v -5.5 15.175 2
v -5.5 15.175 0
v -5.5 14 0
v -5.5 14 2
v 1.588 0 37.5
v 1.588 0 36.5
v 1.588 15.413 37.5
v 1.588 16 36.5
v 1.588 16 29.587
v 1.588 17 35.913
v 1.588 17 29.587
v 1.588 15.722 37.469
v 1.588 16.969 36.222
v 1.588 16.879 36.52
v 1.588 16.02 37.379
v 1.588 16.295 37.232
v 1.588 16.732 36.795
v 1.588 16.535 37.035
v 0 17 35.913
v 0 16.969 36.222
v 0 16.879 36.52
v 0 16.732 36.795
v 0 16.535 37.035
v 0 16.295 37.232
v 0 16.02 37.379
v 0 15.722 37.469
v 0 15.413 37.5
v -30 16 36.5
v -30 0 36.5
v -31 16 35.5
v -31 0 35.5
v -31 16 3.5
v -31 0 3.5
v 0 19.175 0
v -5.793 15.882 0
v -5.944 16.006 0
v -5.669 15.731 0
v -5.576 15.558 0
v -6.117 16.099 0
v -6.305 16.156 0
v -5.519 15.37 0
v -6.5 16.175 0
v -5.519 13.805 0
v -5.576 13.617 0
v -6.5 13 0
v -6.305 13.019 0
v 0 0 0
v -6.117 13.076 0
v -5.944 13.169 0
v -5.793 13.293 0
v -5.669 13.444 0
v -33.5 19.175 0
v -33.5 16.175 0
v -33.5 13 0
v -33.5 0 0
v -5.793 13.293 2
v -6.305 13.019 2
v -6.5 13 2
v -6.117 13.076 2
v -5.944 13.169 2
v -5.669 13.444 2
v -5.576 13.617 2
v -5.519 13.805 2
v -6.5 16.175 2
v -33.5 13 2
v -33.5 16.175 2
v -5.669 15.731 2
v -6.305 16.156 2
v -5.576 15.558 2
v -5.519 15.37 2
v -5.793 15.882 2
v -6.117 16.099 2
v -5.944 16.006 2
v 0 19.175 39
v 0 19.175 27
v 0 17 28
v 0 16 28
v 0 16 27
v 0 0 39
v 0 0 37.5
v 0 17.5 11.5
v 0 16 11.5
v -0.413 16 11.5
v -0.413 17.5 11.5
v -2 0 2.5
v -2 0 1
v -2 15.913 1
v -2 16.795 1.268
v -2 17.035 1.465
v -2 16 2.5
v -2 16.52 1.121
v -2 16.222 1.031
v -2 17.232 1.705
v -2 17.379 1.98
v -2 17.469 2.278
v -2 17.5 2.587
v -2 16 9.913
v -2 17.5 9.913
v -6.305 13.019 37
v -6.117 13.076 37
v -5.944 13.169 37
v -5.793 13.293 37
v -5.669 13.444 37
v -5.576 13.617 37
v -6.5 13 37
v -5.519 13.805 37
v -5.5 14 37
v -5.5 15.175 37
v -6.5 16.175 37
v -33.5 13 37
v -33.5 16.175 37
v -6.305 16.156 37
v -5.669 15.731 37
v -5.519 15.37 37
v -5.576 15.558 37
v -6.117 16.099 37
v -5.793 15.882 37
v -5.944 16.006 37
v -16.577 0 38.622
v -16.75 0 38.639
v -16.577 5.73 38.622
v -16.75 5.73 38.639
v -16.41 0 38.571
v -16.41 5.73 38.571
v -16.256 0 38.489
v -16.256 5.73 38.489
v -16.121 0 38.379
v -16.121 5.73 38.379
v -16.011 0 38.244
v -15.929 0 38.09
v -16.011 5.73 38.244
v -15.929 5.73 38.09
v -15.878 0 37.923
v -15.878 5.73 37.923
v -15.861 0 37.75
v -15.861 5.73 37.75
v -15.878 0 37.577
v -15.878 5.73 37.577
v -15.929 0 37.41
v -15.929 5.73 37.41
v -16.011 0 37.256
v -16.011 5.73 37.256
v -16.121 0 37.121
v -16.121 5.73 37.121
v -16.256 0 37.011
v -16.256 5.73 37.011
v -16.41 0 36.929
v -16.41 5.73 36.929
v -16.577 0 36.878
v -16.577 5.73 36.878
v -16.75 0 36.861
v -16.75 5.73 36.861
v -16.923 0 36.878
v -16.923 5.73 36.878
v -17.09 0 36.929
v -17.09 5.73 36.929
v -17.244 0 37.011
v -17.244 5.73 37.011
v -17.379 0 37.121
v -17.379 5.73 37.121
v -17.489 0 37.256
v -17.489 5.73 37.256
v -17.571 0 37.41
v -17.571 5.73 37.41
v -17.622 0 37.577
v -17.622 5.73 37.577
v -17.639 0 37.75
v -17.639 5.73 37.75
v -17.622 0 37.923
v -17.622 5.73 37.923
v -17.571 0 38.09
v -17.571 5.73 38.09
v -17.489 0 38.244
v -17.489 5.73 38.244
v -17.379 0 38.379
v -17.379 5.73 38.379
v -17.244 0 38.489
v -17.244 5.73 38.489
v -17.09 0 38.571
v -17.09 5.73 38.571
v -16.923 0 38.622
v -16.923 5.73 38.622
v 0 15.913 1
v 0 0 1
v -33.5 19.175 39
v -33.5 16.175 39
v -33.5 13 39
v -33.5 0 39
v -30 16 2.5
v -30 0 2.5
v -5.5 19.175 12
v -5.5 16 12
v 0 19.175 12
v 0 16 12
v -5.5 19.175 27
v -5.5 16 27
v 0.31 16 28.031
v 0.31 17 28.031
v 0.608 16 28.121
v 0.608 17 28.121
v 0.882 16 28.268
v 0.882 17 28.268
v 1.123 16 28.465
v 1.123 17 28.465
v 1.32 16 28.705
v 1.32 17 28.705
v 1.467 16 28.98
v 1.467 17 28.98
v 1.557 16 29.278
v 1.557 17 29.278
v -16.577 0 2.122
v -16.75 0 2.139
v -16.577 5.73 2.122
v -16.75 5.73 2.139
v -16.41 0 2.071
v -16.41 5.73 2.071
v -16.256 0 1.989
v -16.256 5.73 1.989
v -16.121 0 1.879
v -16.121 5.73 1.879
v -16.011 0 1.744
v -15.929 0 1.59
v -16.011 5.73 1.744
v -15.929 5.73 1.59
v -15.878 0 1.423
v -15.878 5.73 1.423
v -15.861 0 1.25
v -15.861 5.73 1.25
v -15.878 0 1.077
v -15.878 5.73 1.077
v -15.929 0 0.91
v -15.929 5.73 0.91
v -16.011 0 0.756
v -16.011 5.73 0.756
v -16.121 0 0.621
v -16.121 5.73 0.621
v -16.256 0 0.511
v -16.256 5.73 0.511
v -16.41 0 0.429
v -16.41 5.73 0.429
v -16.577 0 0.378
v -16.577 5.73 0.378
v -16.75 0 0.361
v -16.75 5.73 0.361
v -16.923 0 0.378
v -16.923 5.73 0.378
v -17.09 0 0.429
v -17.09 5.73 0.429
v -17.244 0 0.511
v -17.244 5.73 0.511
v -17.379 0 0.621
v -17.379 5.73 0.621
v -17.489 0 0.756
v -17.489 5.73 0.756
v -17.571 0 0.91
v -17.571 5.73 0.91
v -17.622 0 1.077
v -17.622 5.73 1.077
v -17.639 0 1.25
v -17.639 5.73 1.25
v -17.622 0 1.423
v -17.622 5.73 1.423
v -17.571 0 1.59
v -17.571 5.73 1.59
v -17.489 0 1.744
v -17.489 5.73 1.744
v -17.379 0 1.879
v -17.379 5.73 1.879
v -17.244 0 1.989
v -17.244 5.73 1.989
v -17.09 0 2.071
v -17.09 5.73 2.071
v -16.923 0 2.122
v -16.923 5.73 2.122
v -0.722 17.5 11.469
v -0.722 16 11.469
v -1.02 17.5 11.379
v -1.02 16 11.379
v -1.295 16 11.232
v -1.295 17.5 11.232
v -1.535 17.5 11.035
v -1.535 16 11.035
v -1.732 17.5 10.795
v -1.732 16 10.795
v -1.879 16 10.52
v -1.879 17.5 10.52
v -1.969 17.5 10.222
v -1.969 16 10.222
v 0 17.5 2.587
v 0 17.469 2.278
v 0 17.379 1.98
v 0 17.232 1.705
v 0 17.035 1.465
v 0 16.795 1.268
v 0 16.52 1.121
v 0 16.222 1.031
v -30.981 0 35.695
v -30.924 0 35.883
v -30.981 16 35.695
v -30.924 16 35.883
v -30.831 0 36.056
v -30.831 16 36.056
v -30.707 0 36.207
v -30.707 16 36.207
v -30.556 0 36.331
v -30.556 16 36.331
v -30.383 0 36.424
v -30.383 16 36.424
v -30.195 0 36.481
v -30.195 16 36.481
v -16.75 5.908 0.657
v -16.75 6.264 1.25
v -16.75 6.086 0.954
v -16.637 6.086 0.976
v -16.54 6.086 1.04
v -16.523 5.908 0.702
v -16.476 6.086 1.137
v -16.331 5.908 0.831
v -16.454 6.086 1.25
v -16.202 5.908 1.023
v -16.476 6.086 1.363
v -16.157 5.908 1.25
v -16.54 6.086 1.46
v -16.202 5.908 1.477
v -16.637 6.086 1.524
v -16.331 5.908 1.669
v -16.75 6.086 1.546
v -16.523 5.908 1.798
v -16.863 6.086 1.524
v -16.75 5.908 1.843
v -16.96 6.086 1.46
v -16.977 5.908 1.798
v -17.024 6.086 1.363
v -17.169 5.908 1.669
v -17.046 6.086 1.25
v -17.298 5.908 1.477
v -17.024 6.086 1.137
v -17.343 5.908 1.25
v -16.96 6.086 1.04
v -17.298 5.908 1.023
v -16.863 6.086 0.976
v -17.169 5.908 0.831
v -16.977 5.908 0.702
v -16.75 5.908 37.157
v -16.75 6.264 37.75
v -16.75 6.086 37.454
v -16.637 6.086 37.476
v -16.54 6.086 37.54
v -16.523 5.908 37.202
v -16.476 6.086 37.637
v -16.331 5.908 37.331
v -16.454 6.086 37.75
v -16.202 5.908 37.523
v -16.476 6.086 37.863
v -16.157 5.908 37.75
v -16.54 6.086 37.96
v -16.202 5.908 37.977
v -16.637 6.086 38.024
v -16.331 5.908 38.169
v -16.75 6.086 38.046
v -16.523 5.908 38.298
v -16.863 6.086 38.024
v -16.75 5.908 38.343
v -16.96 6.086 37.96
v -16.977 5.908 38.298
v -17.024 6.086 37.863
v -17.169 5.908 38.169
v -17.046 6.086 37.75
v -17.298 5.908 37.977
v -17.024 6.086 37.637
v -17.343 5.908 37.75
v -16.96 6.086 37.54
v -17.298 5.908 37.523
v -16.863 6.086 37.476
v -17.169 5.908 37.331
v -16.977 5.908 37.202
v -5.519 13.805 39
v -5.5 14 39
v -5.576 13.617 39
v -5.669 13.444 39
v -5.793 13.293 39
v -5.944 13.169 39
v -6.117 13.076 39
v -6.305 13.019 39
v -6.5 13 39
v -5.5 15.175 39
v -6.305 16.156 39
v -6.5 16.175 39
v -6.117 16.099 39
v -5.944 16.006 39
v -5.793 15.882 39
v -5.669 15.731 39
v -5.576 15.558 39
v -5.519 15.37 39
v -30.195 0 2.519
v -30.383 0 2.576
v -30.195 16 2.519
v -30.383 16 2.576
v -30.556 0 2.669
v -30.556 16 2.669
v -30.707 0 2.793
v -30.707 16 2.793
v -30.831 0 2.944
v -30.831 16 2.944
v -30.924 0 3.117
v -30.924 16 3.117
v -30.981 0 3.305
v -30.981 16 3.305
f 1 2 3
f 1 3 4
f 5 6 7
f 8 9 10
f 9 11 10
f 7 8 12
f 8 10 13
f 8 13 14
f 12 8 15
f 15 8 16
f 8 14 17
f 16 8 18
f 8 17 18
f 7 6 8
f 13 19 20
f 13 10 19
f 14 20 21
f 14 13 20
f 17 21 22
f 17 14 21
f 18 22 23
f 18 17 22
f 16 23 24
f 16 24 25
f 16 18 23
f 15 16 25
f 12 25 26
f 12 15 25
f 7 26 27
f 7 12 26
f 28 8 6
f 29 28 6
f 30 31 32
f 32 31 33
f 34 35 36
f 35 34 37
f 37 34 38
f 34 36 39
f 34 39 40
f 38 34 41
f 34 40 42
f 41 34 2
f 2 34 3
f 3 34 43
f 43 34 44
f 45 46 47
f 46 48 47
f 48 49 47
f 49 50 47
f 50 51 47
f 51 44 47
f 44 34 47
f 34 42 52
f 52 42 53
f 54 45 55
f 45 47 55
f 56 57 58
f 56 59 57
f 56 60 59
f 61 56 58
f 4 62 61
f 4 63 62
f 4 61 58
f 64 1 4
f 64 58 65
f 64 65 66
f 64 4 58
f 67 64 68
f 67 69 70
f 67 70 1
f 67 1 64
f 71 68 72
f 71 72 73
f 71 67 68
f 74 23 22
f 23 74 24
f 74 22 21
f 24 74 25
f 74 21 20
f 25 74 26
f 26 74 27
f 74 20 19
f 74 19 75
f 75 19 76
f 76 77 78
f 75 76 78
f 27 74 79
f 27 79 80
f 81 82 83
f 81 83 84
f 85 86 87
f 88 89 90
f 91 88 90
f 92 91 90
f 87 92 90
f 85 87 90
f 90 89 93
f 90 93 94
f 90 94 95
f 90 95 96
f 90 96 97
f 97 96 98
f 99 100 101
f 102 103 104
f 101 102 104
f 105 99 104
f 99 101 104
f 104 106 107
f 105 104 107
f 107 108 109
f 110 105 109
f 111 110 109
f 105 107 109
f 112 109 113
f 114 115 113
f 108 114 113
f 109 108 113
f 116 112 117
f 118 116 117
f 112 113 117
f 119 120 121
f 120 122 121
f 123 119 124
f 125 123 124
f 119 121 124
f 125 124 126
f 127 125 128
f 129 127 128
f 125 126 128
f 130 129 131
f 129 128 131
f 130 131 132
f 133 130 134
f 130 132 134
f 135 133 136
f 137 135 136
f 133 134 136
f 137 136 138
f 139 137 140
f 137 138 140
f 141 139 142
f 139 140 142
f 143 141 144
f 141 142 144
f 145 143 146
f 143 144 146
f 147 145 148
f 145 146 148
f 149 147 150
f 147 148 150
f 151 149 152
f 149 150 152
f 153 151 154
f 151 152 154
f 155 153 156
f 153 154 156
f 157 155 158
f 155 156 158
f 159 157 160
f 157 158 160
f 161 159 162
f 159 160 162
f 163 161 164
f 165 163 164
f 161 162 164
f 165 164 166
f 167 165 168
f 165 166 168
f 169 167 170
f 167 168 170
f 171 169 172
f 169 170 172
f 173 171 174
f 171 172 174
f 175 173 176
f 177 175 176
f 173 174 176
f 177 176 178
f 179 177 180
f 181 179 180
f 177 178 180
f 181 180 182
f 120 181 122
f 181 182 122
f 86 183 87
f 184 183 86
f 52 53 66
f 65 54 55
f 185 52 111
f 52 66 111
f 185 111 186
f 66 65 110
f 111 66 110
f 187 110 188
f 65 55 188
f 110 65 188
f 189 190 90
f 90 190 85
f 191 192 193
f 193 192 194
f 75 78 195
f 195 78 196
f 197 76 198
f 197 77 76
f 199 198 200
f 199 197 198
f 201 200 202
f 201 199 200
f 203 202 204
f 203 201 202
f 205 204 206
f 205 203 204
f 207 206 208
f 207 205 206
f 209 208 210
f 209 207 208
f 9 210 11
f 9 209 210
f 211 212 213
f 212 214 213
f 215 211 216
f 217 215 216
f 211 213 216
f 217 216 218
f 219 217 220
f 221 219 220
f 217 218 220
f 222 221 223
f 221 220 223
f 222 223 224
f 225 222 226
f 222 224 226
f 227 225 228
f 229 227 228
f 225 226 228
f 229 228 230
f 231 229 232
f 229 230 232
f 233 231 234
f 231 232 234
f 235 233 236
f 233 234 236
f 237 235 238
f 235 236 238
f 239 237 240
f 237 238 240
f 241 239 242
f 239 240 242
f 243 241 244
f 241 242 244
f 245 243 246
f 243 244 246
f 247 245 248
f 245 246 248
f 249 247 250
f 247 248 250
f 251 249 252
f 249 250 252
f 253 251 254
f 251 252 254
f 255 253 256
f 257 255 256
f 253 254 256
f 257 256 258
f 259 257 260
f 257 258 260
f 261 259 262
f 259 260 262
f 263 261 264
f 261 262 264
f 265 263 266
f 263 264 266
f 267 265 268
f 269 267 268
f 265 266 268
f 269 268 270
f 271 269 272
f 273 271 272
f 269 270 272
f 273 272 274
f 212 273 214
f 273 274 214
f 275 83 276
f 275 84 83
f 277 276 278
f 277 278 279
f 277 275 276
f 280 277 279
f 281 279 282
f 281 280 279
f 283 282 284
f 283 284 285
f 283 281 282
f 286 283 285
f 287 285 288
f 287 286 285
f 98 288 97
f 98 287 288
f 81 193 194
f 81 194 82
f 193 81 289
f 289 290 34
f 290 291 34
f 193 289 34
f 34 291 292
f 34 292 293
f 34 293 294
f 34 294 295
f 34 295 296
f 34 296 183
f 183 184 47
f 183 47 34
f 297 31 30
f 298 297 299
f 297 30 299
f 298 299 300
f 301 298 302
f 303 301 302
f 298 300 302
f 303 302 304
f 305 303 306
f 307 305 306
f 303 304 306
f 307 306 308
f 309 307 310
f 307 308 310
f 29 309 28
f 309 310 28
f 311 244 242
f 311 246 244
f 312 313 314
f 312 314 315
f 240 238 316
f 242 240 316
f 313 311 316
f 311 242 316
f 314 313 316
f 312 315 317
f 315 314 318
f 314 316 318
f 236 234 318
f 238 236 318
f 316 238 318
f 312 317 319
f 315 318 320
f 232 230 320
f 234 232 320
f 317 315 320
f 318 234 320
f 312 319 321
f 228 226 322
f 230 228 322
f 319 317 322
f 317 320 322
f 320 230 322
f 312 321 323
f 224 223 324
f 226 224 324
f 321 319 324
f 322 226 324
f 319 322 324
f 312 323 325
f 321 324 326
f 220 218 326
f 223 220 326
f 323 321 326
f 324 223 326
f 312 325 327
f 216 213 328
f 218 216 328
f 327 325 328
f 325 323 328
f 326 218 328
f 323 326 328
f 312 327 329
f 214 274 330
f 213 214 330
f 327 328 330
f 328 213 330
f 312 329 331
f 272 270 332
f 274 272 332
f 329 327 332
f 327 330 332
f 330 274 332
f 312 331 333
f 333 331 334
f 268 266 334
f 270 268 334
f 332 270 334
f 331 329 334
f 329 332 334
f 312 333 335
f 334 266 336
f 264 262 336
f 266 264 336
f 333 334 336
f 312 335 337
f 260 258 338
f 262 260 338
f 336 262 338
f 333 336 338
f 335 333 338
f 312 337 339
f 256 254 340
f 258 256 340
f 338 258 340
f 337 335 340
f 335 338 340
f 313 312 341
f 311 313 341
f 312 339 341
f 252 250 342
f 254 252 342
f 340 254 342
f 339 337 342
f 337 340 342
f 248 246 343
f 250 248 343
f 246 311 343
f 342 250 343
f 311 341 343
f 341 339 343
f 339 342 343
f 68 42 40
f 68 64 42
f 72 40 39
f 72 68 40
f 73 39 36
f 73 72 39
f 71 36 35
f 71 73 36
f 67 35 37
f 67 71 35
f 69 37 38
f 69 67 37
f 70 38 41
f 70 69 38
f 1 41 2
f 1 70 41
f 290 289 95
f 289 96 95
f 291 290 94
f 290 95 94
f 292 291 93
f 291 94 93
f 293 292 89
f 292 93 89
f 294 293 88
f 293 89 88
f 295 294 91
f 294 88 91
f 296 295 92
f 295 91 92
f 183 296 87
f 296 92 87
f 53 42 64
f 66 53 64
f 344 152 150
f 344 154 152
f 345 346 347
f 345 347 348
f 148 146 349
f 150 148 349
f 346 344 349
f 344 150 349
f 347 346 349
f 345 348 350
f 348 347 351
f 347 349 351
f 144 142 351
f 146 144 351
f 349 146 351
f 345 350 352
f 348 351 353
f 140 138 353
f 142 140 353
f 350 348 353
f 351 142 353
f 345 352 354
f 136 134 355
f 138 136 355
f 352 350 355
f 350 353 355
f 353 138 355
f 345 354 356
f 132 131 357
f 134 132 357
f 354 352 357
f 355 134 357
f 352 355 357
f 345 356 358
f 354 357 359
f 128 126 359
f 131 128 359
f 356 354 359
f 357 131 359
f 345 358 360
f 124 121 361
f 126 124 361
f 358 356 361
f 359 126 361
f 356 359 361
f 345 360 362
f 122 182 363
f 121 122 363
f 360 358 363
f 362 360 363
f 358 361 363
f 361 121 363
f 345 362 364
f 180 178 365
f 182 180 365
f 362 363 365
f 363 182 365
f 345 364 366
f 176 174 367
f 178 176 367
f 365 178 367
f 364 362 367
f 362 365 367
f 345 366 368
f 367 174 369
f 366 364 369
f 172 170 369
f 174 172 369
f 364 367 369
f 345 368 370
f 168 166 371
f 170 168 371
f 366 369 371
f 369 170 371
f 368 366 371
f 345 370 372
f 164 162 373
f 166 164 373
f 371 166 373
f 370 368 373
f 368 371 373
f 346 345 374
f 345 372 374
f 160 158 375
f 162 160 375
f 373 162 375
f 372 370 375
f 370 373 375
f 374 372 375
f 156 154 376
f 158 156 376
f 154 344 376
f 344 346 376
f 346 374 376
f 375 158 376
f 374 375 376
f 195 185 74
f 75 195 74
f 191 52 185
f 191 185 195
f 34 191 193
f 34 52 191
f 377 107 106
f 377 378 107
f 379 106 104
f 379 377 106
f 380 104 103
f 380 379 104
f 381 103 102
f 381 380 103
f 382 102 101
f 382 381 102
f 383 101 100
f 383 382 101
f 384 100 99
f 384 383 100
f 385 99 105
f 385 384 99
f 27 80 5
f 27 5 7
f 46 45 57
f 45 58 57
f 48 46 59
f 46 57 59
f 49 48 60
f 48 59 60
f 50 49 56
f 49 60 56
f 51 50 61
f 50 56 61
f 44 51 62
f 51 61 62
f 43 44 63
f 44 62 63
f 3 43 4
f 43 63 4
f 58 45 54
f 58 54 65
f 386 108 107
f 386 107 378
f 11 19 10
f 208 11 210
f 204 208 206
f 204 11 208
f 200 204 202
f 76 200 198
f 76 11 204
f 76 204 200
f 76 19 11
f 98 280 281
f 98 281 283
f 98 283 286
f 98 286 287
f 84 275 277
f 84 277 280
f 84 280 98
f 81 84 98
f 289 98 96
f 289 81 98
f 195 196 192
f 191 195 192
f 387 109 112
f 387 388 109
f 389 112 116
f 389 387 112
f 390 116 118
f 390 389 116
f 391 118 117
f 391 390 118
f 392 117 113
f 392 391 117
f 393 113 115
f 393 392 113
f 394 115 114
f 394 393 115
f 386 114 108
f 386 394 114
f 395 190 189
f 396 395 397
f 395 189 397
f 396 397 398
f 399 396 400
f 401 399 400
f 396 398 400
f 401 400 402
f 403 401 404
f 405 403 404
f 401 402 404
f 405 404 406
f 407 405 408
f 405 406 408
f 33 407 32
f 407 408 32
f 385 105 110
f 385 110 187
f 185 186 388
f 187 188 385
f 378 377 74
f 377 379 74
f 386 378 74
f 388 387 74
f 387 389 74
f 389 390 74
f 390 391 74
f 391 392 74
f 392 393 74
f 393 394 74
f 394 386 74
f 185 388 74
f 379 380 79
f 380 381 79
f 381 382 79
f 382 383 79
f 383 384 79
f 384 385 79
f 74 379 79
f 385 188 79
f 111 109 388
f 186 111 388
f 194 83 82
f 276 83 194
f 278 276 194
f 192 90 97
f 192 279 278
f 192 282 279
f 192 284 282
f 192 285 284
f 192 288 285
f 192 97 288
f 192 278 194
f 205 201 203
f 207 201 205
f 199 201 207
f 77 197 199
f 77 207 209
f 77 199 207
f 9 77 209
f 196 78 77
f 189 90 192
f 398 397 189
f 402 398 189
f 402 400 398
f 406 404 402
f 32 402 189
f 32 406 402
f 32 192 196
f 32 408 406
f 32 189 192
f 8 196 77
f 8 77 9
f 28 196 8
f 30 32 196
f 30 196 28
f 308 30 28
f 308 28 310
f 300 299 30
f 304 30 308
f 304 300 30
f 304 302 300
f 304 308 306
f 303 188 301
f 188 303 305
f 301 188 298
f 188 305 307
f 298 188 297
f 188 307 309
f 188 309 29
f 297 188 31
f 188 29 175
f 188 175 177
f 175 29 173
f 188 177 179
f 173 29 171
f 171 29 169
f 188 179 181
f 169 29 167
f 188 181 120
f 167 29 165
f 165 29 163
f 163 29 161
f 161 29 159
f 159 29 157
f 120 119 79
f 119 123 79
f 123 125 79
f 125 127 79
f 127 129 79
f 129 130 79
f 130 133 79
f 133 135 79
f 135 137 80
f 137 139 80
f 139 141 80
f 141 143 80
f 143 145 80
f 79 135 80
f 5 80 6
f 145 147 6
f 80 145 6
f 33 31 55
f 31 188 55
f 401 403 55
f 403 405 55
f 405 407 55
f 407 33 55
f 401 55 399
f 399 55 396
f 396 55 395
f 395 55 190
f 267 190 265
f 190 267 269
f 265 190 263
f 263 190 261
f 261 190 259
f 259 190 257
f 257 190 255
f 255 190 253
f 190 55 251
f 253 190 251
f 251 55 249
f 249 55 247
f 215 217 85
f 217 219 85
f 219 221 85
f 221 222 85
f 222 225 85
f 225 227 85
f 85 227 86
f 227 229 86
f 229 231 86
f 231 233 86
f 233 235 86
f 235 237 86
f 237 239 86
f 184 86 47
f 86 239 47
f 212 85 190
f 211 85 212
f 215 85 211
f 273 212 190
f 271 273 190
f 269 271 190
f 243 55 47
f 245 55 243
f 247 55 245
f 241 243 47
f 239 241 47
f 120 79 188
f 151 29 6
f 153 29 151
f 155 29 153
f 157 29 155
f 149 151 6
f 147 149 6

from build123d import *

# Parameters (mm, degrees)
WALL_DEPTH                = 16
ROOF_START                = 16
ROOF_DEPTH                = 3.175
F_2_56_TAPPED_HOLE1_D     = 1.778
F_2_56_TAPPED_HOLE1_DEPTH = 5.73
F_2_56_TAPPED_HOLE1_TIP   = 0.53416509
BOSS_EXTRUDE1_DEPTH       = 1.5875
CUT_EXTRUDE3_DEPTH        = 2
FILLET1_R                 = 1.5875
RAIL_CUT_DEPTH            = 56.855288749
RAIL_CUT_DEPTH_BACK       = 28
SKETCH4_W                 = 2
SKETCH4_H                 = 3.175
FILLET2_R                 = 1


with BuildPart() as part:
    # MainSketch → Wall (new body)
    with BuildSketch(Plane(origin=(0, 0, 0), x_dir=(1, 0, 0), z_dir=(0, 1, 0))):
        Polygon((-31, -2.5), (0, -2.5), (0, 0), (-33.5, 0), (-33.5, -39), (0, -39), (0, -36.5), (-31, -36.5), align=None)
    extrude(amount=WALL_DEPTH)

    # MainSketch<3> → Roof (add)
    with BuildSketch(Plane(origin=(0, 0, 0), x_dir=(1, 0, 0), z_dir=(0, 1, 0)).offset(ROOF_START)):
        Polygon((0, -12), (0, 0), (-33.5, 0), (-33.5, -39), (0, -39), (0, -27), (-5.5, -27), (-5.5, -12), align=None)
    extrude(amount=ROOF_DEPTH)

    # #2-56 Tapped Hole1
    with Locations(Plane(origin=(-16.75, 0, 37.75), x_dir=(0, 0, -1), z_dir=(0, -1, 0))):
        with Locations((0, 0), (36.5, 0)):
            Hole(F_2_56_TAPPED_HOLE1_D / 2, depth=F_2_56_TAPPED_HOLE1_DEPTH)
            with Locations((0, 0, -(F_2_56_TAPPED_HOLE1_DEPTH + F_2_56_TAPPED_HOLE1_TIP / 2))):  # 118° drill point
                Cone(0, F_2_56_TAPPED_HOLE1_D / 2, F_2_56_TAPPED_HOLE1_TIP, mode=Mode.SUBTRACT)

    # Sketch3 → Boss-Extrude1 (add)
    with BuildSketch(Plane(origin=(0, 0, 0), x_dir=(0, 0, -1), z_dir=(1, 0, 0))):
        Polygon((-28, 17), (-28, 16), (-36.5, 16), (-36.5, 0), (-37.5, 0), (-37.5, 17), align=None)
    extrude(amount=BOSS_EXTRUDE1_DEPTH)

    # Sketch3<3> → Cut-Extrude3 (cut)
    with BuildSketch(Plane(origin=(0, 0, 0), x_dir=(0, 0, -1), z_dir=(1, 0, 0))):
        Polygon((-11.5, 16), (-11.5, 17.5), (-1, 17.5), (-1, 0), (-2.5, 0), (-2.5, 16), align=None)
    extrude(amount=-CUT_EXTRUDE3_DEPTH, mode=Mode.SUBTRACT)

    # Fillet1
    fillet1_edges = [part.edges().sort_by_distance(p)[0] for p in [
        (0.79375, 17, 37.5),
        (1.5875, 16.5, 28),
        (-1, 17.5, 1),
        (-2, 16.75, 11.5),
    ]]
    fillet(fillet1_edges, radius=FILLET1_R - 0.0001)  # a hair under: the kernel refuses the full size

    # Sketch4 → rail cut (cut, two sides: drawn at the far end of the back side and taken through both)
    with BuildSketch(Plane.ZY.offset(33.5).offset(-RAIL_CUT_DEPTH_BACK)):
        with Locations((1, 14.5875)):
            Rectangle(SKETCH4_W, SKETCH4_H)
        with Locations((38, 14.5875)):
            Rectangle(SKETCH4_W, SKETCH4_H)
    extrude(amount=RAIL_CUT_DEPTH + RAIL_CUT_DEPTH_BACK, mode=Mode.SUBTRACT)

    # Fillet2
    fillet2_edges = [part.edges().sort_by_distance(p)[0] for p in [
        (-5.5, 16.175, 1),
        (-5.5, 13, 1),
        (-5.5, 13, 38),
        (-5.5, 16.175, 38),
        (-31, 8, 2.5),
        (-31, 8, 36.5),
    ]]
    fillet(fillet2_edges, radius=FILLET2_R)


solid = part.part
